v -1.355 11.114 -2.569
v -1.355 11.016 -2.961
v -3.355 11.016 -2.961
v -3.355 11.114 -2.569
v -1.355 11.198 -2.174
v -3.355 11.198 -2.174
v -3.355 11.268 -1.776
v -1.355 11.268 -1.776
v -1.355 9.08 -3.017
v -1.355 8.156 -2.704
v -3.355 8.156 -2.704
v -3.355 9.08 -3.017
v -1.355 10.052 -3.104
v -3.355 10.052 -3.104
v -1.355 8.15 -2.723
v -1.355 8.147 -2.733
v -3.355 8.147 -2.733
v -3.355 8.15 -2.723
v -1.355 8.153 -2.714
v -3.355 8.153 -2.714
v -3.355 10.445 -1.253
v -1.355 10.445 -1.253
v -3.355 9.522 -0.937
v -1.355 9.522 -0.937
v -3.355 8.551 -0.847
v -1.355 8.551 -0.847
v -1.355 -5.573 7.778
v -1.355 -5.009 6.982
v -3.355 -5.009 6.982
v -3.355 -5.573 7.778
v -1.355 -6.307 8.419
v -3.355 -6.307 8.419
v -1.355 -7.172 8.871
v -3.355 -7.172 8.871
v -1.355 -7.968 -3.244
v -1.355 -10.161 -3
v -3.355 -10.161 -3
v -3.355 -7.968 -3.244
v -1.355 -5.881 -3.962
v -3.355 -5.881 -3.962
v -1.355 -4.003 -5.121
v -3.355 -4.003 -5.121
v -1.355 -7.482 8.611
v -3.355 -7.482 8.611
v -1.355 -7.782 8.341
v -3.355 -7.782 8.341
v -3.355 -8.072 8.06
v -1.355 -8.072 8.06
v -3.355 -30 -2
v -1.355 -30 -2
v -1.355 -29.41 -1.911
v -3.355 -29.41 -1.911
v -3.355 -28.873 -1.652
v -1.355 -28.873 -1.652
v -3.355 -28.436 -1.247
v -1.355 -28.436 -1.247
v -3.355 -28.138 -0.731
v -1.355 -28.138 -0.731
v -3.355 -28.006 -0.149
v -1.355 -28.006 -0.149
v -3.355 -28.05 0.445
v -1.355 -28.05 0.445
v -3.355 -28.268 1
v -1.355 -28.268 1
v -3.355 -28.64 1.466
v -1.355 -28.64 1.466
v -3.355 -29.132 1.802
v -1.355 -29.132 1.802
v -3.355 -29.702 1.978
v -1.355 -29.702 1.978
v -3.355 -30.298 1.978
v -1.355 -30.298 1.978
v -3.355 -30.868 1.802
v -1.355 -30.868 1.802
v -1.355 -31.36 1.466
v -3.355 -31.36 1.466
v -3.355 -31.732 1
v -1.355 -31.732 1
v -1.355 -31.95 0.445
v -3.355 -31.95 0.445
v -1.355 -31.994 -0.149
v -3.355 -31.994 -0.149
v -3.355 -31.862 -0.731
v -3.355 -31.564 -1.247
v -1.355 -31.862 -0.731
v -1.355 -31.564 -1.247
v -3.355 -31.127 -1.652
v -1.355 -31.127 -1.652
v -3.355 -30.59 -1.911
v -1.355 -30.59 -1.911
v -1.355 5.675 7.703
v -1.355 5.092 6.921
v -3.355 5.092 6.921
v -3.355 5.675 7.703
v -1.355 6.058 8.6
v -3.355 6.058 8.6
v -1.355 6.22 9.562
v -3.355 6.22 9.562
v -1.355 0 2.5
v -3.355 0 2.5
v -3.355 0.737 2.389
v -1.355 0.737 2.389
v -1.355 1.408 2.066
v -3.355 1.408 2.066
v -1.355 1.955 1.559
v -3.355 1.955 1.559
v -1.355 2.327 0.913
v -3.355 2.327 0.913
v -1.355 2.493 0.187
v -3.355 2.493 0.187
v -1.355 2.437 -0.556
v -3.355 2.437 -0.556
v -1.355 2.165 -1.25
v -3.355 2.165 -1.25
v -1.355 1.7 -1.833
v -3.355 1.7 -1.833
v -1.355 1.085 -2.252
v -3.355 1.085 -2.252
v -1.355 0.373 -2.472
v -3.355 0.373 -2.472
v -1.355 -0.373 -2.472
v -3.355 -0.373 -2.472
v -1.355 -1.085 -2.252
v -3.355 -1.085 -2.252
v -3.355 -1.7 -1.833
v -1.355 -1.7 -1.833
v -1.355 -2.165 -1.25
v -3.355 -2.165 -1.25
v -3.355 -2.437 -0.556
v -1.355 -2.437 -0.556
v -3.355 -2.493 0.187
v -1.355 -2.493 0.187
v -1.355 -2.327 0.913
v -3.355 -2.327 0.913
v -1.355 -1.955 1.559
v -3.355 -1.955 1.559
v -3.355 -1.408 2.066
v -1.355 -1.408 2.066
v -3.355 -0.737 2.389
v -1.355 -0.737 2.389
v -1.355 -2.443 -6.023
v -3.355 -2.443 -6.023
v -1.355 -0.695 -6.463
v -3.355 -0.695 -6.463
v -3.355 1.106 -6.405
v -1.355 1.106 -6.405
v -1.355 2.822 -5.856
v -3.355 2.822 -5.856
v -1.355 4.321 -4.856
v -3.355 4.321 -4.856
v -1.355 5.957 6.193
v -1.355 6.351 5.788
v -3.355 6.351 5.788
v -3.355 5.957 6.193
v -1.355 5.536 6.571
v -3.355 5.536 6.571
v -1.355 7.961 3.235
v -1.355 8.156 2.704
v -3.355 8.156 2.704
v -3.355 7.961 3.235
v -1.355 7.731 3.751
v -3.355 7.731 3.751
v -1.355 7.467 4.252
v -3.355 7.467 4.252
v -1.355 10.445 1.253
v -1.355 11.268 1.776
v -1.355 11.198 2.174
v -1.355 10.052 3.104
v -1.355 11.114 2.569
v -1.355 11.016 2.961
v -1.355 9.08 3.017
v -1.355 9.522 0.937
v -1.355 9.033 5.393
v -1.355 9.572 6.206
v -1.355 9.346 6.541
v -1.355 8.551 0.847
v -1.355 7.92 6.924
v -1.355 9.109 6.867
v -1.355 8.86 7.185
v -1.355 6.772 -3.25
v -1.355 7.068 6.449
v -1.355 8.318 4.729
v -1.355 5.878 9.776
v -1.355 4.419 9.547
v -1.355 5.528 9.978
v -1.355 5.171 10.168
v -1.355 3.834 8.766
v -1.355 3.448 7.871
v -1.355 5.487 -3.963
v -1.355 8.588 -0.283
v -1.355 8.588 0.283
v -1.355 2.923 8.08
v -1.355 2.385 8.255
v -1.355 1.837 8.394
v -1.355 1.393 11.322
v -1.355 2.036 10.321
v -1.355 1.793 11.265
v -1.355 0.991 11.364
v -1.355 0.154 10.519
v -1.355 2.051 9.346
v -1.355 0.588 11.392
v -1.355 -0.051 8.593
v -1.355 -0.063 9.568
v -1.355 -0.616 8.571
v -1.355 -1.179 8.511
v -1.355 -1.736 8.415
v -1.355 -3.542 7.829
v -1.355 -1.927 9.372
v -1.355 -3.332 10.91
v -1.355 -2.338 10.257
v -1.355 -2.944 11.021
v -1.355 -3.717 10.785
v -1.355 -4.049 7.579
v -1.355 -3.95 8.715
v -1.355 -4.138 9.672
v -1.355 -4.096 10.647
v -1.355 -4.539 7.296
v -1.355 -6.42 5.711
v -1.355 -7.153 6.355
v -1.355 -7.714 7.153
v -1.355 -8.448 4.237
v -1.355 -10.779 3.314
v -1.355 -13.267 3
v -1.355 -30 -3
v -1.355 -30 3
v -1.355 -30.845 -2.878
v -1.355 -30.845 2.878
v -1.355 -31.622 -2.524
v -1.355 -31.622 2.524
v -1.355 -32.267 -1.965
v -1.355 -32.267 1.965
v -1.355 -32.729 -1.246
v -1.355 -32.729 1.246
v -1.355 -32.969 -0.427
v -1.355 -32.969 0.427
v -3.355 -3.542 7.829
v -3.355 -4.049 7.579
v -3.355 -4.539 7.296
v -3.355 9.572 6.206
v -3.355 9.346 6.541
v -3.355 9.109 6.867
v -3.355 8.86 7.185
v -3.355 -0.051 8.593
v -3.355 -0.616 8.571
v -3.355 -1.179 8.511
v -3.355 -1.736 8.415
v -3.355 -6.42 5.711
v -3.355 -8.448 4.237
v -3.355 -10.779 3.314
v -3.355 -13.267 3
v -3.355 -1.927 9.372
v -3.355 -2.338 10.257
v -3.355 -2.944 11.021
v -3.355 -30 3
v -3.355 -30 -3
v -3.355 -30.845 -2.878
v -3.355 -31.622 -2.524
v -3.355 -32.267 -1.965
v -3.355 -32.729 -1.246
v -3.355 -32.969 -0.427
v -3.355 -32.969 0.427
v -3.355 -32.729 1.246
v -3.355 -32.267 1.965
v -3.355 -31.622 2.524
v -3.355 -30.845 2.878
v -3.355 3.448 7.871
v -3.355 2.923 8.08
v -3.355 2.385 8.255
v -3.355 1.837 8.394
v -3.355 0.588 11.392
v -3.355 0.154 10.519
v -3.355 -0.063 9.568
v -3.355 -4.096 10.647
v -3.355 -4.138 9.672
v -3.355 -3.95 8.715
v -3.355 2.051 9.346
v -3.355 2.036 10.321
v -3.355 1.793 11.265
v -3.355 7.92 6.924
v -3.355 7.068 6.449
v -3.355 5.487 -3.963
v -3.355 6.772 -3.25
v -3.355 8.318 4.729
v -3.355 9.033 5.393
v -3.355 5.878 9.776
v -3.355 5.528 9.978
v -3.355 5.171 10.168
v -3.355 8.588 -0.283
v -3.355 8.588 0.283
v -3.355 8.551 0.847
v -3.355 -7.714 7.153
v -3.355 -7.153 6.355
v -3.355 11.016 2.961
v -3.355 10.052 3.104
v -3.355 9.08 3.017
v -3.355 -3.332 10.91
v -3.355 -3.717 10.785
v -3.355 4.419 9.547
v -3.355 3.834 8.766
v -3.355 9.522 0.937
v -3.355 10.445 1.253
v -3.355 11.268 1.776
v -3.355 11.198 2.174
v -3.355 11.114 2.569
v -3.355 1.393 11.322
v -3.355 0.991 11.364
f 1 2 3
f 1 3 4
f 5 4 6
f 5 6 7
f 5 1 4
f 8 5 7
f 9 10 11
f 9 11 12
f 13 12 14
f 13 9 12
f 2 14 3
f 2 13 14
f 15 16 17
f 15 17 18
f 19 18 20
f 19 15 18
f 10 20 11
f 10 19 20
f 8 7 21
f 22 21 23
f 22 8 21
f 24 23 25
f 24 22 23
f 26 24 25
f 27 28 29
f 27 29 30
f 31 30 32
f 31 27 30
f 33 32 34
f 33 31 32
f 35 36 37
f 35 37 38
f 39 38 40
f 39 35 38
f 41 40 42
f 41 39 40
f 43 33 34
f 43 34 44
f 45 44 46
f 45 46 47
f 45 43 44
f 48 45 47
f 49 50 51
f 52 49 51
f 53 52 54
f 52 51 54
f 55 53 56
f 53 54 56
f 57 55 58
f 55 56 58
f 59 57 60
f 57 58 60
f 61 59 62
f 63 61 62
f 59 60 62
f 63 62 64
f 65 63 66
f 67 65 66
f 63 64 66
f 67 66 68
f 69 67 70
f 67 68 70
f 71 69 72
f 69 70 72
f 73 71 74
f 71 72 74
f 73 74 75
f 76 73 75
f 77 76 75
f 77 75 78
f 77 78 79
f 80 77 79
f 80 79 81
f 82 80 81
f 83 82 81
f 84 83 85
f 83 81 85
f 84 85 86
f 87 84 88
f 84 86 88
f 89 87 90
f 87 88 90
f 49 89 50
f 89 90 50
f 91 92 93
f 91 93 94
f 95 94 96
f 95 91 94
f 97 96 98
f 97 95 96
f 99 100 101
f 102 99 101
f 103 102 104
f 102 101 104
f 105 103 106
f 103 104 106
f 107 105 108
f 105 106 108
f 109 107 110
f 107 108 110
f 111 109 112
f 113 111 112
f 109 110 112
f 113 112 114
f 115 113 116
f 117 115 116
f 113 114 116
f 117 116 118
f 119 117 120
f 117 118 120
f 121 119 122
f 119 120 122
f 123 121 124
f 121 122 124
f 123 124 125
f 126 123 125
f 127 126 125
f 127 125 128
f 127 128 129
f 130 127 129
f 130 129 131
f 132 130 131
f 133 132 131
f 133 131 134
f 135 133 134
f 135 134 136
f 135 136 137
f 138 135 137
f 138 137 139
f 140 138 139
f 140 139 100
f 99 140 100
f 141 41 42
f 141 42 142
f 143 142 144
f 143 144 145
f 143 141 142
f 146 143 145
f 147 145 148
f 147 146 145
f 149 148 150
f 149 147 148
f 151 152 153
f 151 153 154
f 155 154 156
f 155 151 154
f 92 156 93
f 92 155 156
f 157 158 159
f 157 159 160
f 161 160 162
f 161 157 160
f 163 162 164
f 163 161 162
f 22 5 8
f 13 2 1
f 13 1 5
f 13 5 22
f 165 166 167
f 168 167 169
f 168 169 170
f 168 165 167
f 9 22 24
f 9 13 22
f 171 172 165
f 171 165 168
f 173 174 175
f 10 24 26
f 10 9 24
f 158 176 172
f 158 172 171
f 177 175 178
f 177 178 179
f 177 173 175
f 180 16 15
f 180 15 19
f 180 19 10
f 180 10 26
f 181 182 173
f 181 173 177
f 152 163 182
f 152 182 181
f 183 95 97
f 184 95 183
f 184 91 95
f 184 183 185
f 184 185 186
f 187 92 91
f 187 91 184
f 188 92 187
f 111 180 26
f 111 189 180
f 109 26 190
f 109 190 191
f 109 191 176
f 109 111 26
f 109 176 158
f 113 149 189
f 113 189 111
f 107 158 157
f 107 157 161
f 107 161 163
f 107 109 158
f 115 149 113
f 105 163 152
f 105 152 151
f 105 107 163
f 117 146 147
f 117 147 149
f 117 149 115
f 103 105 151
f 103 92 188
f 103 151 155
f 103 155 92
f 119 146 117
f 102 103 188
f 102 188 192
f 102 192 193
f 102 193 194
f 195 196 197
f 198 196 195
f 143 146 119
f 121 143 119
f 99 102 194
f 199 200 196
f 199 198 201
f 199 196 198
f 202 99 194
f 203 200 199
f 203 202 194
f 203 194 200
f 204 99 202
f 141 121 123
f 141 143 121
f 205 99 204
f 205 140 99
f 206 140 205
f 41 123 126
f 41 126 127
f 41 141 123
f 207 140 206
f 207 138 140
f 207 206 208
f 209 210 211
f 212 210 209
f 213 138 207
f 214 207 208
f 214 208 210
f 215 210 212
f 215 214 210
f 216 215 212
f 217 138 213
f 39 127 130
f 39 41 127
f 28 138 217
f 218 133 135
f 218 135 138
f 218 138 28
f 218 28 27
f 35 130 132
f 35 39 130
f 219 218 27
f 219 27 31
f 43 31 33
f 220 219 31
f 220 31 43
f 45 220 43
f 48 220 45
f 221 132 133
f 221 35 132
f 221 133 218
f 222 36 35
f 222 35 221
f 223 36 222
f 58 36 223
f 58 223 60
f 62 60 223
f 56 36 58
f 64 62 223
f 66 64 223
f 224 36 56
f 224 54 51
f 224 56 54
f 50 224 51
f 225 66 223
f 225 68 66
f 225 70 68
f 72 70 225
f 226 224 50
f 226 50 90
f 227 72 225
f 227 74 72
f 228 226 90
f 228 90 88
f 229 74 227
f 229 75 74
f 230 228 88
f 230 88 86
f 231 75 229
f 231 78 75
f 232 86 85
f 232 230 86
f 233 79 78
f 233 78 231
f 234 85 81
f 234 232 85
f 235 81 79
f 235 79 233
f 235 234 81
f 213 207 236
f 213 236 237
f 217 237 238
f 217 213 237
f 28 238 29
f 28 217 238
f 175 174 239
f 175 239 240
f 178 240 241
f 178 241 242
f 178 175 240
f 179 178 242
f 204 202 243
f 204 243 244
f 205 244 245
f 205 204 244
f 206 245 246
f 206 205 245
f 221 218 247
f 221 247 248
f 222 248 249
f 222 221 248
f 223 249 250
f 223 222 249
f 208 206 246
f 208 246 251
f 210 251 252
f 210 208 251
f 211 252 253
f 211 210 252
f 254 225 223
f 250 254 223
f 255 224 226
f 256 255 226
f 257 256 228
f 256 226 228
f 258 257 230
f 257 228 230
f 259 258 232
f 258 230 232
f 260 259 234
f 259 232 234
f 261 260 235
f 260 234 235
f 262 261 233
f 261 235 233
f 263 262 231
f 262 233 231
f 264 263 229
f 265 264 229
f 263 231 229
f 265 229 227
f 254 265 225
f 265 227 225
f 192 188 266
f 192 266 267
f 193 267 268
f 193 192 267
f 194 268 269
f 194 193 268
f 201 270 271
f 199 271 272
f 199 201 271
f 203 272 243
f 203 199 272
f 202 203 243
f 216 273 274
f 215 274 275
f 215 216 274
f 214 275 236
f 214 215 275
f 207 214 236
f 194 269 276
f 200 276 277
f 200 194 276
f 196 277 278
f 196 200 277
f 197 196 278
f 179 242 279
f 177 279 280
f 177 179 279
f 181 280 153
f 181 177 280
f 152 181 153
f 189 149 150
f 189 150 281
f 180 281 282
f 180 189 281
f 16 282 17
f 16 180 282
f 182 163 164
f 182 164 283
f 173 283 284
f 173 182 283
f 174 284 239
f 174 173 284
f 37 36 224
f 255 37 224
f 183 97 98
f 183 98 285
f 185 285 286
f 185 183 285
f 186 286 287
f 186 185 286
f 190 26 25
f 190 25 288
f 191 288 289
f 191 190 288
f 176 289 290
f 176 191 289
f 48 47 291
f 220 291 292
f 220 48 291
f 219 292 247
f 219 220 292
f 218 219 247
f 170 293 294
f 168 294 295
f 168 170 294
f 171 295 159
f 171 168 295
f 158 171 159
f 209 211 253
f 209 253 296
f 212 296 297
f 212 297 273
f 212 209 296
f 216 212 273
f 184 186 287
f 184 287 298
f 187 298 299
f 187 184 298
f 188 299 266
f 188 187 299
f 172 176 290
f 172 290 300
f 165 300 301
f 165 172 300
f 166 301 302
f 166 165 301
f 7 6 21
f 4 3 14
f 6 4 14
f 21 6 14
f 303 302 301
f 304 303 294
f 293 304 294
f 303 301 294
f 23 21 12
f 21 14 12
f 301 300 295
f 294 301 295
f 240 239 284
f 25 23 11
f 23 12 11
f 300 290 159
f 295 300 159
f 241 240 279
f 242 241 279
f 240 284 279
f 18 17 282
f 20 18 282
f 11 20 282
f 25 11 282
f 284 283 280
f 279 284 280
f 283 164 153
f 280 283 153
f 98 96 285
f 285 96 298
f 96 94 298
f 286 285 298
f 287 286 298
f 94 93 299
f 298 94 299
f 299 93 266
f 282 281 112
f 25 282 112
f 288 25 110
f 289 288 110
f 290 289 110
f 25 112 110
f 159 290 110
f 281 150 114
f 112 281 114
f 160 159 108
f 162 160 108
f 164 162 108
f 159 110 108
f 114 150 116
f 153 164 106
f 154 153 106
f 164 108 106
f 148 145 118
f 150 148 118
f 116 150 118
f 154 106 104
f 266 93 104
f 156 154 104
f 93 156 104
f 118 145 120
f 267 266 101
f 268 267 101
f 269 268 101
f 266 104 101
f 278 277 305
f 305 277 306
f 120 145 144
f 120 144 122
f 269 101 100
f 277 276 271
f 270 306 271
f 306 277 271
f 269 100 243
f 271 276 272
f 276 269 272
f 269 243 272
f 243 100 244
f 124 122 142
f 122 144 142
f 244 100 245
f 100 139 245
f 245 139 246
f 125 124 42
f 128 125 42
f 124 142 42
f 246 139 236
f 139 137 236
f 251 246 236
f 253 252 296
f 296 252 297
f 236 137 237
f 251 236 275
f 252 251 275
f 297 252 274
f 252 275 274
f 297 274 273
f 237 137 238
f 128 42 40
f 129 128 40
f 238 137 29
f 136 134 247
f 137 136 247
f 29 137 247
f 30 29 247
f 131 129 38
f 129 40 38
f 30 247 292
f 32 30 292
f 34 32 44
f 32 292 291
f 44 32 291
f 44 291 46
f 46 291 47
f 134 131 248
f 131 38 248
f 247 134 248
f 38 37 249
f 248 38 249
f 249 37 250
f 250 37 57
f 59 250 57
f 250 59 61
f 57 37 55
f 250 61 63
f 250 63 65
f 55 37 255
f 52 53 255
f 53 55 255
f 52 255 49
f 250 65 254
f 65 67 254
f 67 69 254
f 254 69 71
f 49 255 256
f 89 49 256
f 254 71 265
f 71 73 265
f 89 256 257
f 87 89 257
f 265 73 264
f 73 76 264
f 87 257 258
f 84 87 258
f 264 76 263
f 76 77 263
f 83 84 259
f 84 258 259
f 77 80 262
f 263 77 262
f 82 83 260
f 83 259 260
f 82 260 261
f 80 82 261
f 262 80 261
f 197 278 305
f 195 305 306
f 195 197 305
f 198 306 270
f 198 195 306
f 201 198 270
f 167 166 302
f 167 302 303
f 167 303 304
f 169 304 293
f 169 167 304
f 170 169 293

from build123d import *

# Parameters (mm, degrees)
SKETCH1_R           = 1.5
BOSS_EXTRUDE1_DEPTH = 2
SKETCH3_OUTSIDE_W   = 31.914
SKETCH3_OUTSIDE_H   = 31.796
SKETCH3_OUTSIDE_R   = 11.40725
CUT_EXTRUDE1_DEPTH  = 17.630863493
SKETCH4_R           = 2.5
CUT_EXTRUDE2_DEPTH  = 17.245136509
SKETCH5_R           = 2
BOSS_EXTRUDE2_DEPTH = 2
CUT_EXTRUDE3_DEPTH  = 35.968258573
CUT_EXTRUDE4_DEPTH  = 35.968258573
FILLET1_R           = 10


with BuildPart() as part:
    # Sketch1 → Boss-Extrude1 (new body)
    with BuildSketch(Plane(origin=(-1.354941904, 0, 0), x_dir=(0, 0, -1), z_dir=(1, 0, 0))):
        with BuildLine():
            ThreePointArc((-11.66138775, 0.780827758), (-10.210393031, 0.057188521), (-8.592596732, -0.051322118))
            ThreePointArc((-8.592596732, -0.051322118), (-8.545678016, -0.898186953), (-8.415498346, -1.736300708))
            ThreePointArc((-8.415498346, -1.736300708), (-9.975381284, -2.178798893), (-11.24421523, -3.188303642))
            ThreePointArc((-11.24421523, -3.188303642), (-11.115473034, -3.611636122), (-10.97079907, -4.029792056))
            ThreePointArc((-10.97079907, -4.029792056), (-9.350918841, -4.100696673), (-7.828853128, -3.541809038))
            ThreePointArc((-7.828853128, -3.541809038), (-7.441539788, -4.296375), (-6.981723166, -5.009081172))
            ThreePointArc((-6.981723166, -5.009081172), (-8.226766912, -6.047784929), (-8.975301827, -7.486094667))
            ThreePointArc((-8.975301827, -7.486094667), (-8.685505148, -7.820463962), (-8.383259564, -8.143624213))
            ThreePointArc((-8.383259564, -8.143624213), (-6.874585833, -7.549534157), (-5.711429695, -6.419884999))
            ThreePointArc((-5.711429695, -6.419884999), (-5.050691727, -6.951680778), (-4.340744624, -7.415745996))
            ThreePointArc((-4.340744624, -7.415745996), (-5.055669804, -8.871054007), (-5.154477201, -10.489471914))
            ThreePointArc((-5.154477201, -10.489471914), (-4.753734516, -10.677062536), (-4.34617832, -10.849349762))
            ThreePointArc((-4.34617832, -10.849349762), (-3.209574481, -9.692988601), (-2.606448181, -8.187904521))
            ThreePointArc((-2.606448181, -8.187904521), (-1.786533181, -8.404977796), (-0.949211902, -8.540160966))
            ThreePointArc((-0.949211902, -8.540160966), (-1.010401457, -10.160437258), (-0.442396639, -11.679124174))
            ThreePointArc((-0.442396639, -11.679124174), (0, -11.6875), (0.442396639, -11.679124174))
            ThreePointArc((0.442396639, -11.679124174), (1.010401457, -10.160437258), (0.949211902, -8.540160966))
            ThreePointArc((0.949211902, -8.540160966), (1.786533181, -8.404977796), (2.606448181, -8.187904521))
            ThreePointArc((2.606448181, -8.187904521), (3.209574481, -9.692988601), (4.34617832, -10.849349762))
            ThreePointArc((4.34617832, -10.849349762), (4.753734516, -10.677062536), (5.154477201, -10.489471914))
            ThreePointArc((5.154477201, -10.489471914), (5.055669804, -8.871054007), (4.340744624, -7.415745996))
            ThreePointArc((4.340744624, -7.415745996), (5.050691727, -6.951680778), (5.711429695, -6.419884999))
            ThreePointArc((5.711429695, -6.419884999), (6.874585833, -7.549534157), (8.383259564, -8.143624213))
            ThreePointArc((8.383259564, -8.143624213), (8.685505148, -7.820463962), (8.975301827, -7.486094667))
            ThreePointArc((8.975301827, -7.486094667), (8.226766912, -6.047784929), (6.981723166, -5.009081172))
            ThreePointArc((6.981723166, -5.009081172), (7.441539788, -4.296375), (7.828853128, -3.541809038))
            ThreePointArc((7.828853128, -3.541809038), (9.350918841, -4.100696673), (10.97079907, -4.029792056))
            ThreePointArc((10.97079907, -4.029792056), (11.115473034, -3.611636122), (11.24421523, -3.188303642))
            ThreePointArc((11.24421523, -3.188303642), (9.975381284, -2.178798893), (8.415498346, -1.736300708))
            ThreePointArc((8.415498346, -1.736300708), (8.545678016, -0.898186953), (8.592596732, -0.051322118))
            ThreePointArc((8.592596732, -0.051322118), (10.210393031, 0.057188521), (11.66138775, 0.780827758))
            ThreePointArc((11.66138775, 0.780827758), (11.623474652, 1.221676414), (11.568901669, 1.660774047))
            ThreePointArc((11.568901669, 1.660774047), (9.999161608, 2.066921265), (8.394157409, 1.836701922))
            ThreePointArc((8.394157409, 1.836701922), (8.17219088, 2.655305778), (7.8706023, 3.448038862))
            ThreePointArc((7.8706023, 3.448038862), (9.304397507, 4.205185299), (10.335616548, 5.456435359))
            ThreePointArc((10.335616548, 5.456435359), (10.121671907, 5.84375), (9.893219909, 6.222688815))
            ThreePointArc((9.893219909, 6.222688815), (8.29399605, 5.955251959), (6.921390398, 5.092122104))
            ThreePointArc((6.921390398, 5.092122104), (6.385657699, 5.749672018), (5.787709228, 6.351202599))
            ThreePointArc((5.787709228, 6.351202599), (6.789587127, 7.626067336), (7.222723349, 9.188575716))
            ThreePointArc((7.222723349, 9.188575716), (6.869740136, 9.455386122), (6.506910549, 9.708644156))
            ThreePointArc((6.506910549, 9.708644156), (5.154723227, 8.813865487), (4.251852108, 7.467068114))
            ThreePointArc((4.251852108, 7.467068114), (3.49498629, 7.849867731), (2.704068651, 8.156185707))
            ThreePointArc((2.704068651, 8.156185707), (3.100795451, 9.728333051), (2.860955666, 11.331927856))
            ThreePointArc((2.860955666, 11.331927856), (2.429967886, 11.432100084), (1.995497243, 11.515886722))
            ThreePointArc((1.995497243, 11.515886722), (1.124151929, 10.148481601), (0.847129962, 8.55089021))
            ThreePointArc((0.847129962, 8.55089021), (0, 8.59275), (-0.847129962, 8.55089021))
            ThreePointArc((-0.847129962, 8.55089021), (-1.124151929, 10.148481601), (-1.995497243, 11.515886722))
            ThreePointArc((-1.995497243, 11.515886722), (-2.429967886, 11.432100084), (-2.860955666, 11.331927856))
            ThreePointArc((-2.860955666, 11.331927856), (-3.100795451, 9.728333051), (-2.704068651, 8.156185707))
            ThreePointArc((-2.704068651, 8.156185707), (-3.49498629, 7.849867731), (-4.251852108, 7.467068114))
            ThreePointArc((-4.251852108, 7.467068114), (-5.154723227, 8.813865487), (-6.506910549, 9.708644156))
            ThreePointArc((-6.506910549, 9.708644156), (-6.869740136, 9.455386122), (-7.222723349, 9.188575716))
            ThreePointArc((-7.222723349, 9.188575716), (-6.789587127, 7.626067336), (-5.787709228, 6.351202599))
            ThreePointArc((-5.787709228, 6.351202599), (-6.385657699, 5.749672018), (-6.921390398, 5.092122104))
            ThreePointArc((-6.921390398, 5.092122104), (-8.29399605, 5.955251959), (-9.893219909, 6.222688815))
            ThreePointArc((-9.893219909, 6.222688815), (-10.121671907, 5.84375), (-10.335616548, 5.456435359))
            ThreePointArc((-10.335616548, 5.456435359), (-9.304397507, 4.205185299), (-7.8706023, 3.448038862))
            ThreePointArc((-7.8706023, 3.448038862), (-8.17219088, 2.655305778), (-8.394157409, 1.836701922))
            ThreePointArc((-8.394157409, 1.836701922), (-9.999161608, 2.066921265), (-11.568901669, 1.660774047))
            ThreePointArc((-11.568901669, 1.660774047), (-11.623474652, 1.221676414), (-11.66138775, 0.780827758))
        make_face()
        with Locations(Location((0, 0, 0), (0, 0, 180))):
            Circle(SKETCH1_R, mode=Mode.SUBTRACT)
    extrude(amount=-BOSS_EXTRUDE1_DEPTH)

    # Sketch3 outside → Cut-Extrude1 (cut, through all)
    with BuildSketch(Plane(origin=(-1.354941904, 0, 0), x_dir=(0, 0, -1), z_dir=(1, 0, 0))):
        with Locations((0, -0.086)):
            Rectangle(SKETCH3_OUTSIDE_W, SKETCH3_OUTSIDE_H)
        Circle(SKETCH3_OUTSIDE_R, mode=Mode.SUBTRACT)
    extrude(amount=-CUT_EXTRUDE1_DEPTH, mode=Mode.SUBTRACT)

    # Sketch4 → Cut-Extrude2 (cut, through all)
    with BuildSketch(Plane.ZY.offset(3.354941904)):
        Circle(SKETCH4_R)
    extrude(amount=-CUT_EXTRUDE2_DEPTH, mode=Mode.SUBTRACT)

    # Sketch5 → Boss-Extrude2 (add)
    with BuildSketch(Plane(origin=(-1.354941904, 0, 0), x_dir=(0, 0, -1), z_dir=(1, 0, 0))):
        with BuildLine():
            Line((-3, -30), (-3, -2.958198886))
            Line((-3, -2.958198886), (3, -2.958198886))
            Line((3, -2.958198886), (3, -30))
            ThreePointArc((3, -30), (0, -33), (-3, -30))
        make_face()
        with Locations((0, -30)):
            Circle(SKETCH5_R, mode=Mode.SUBTRACT)
    extrude(amount=-BOSS_EXTRUDE2_DEPTH)

    # Sketch6 → Cut-Extrude3 (cut, through all)
    with BuildSketch(Plane(origin=(-1.354941904, 0, 0), x_dir=(0, 0, -1), z_dir=(1, 0, 0))):
        with BuildLine():
            Line((3, -11.005696369), (3, -5.766281297))
            ThreePointArc((3, -5.766281297), (6.480220208, 0.506701151), (2.067265096, 6.162500712))
            Line((2.067265096, 6.162500712), (3.627970733, 10.81495173))
            ThreePointArc((3.627970733, 10.81495173), (11.4025291, -0.328150407), (3, -11.005696369))
        make_face()
    extrude(amount=-CUT_EXTRUDE3_DEPTH, mode=Mode.SUBTRACT)

    # Sketch7 → Cut-Extrude4 (cut, through all)
    with BuildSketch(Plane(origin=(-1.354941904, 0, 0), x_dir=(0, 0, -1), z_dir=(1, 0, 0))):
        with BuildLine():
            Line((-3, -11.005696369), (-3, -8.052040273))
            ThreePointArc((-3, -8.052040273), (-3.929768687, -7.641483536), (-4.804556181, -7.124015193))
            Line((-4.804556181, -7.124015193), (-6.378257659, -9.457440552))
            ThreePointArc((-6.378257659, -9.457440552), (-4.752599625, -10.370060239), (-3, -11.005696369))
        make_face()
    extrude(amount=-CUT_EXTRUDE4_DEPTH, mode=Mode.SUBTRACT)

    # Fillet1
    # the kernel refuses this fillet: 10 mm, written as the material it adds along each edge
    with BuildSketch(Plane(origin=(-1.354941904, -8.052040273, 3), x_dir=(0, -1, 0), z_dir=(-1, 0, 0))) as fillet1_piece_1:
        with BuildLine():
            CenterArc((5.214503978, 10), FILLET1_R, 226.79066028, 43.20933972)
            Line((-1.632155274, 2.711429695), (-1.769088459, 2.565658289))
            ThreePointArc((-1.769088459, 2.565658289), (-0.861521793, 1.328359568), (-0.187414746, -0.069826307))
            Line((-0.187414746, -0.069826307), (0, -0.2))
            Line((0, -0.2), (5.214503978, -0.2))
            Line((5.214503978, -0.2), (5.214503978, 0))
        make_face()
    extrude(amount=2)
    with BuildSketch(Plane(origin=(-1.354941904, 6.162500712, -2.067265096), x_dir=(0, 0.9480770325968022, -0.3180407839608656), z_dir=(-1, 0, 0))) as fillet1_piece_2:
        with BuildLine():
            CenterArc((7.819359493, 8.197923134), FILLET1_R, 209.791407991, 25.272600943)
            Line((-0.8590402, 3.229484871), (-1.032608194, 3.130116106))
            ThreePointArc((-1.032608194, 3.130116106), (-0.411709255, 1.619480105), (-0.2, 0))
            Line((-0.2, 0), (0, -0.2))
            ThreePointArc((0, -0.2), (1.046375, -0.2), (1.97821781, -0.163958463))
            Line((1.97821781, -0.163958463), (2.09275, 0))
        make_face()
    extrude(amount=2)
    with BuildSketch(Plane(origin=(-1.354941904, -5.766281297, -3), x_dir=(0, 0.6392655253408549, -0.7689860779693485), z_dir=(-1, 0, 0))) as fillet1_piece_3:
        with BuildLine():
            CenterArc((4.880340308, 9.772287101), FILLET1_R, 219.737073353, 38.012279544)
            Line((-2.809520471, 3.379631847), (-2.963317687, 3.251778742))
            Line((-2.963317687, 3.251778742), (-0.153797216, -0.127853105))
            Line((-0.153797216, -0.127853105), (0.042437742, -0.195445742))
            ThreePointArc((0.042437742, -0.195445742), (1.379226609, -0.051986615), (2.716015476, -0.195445742))
            Line((2.716015476, -0.195445742), (2.758453218, 0))
        make_face()
    extrude(amount=2)


solid = part.part
